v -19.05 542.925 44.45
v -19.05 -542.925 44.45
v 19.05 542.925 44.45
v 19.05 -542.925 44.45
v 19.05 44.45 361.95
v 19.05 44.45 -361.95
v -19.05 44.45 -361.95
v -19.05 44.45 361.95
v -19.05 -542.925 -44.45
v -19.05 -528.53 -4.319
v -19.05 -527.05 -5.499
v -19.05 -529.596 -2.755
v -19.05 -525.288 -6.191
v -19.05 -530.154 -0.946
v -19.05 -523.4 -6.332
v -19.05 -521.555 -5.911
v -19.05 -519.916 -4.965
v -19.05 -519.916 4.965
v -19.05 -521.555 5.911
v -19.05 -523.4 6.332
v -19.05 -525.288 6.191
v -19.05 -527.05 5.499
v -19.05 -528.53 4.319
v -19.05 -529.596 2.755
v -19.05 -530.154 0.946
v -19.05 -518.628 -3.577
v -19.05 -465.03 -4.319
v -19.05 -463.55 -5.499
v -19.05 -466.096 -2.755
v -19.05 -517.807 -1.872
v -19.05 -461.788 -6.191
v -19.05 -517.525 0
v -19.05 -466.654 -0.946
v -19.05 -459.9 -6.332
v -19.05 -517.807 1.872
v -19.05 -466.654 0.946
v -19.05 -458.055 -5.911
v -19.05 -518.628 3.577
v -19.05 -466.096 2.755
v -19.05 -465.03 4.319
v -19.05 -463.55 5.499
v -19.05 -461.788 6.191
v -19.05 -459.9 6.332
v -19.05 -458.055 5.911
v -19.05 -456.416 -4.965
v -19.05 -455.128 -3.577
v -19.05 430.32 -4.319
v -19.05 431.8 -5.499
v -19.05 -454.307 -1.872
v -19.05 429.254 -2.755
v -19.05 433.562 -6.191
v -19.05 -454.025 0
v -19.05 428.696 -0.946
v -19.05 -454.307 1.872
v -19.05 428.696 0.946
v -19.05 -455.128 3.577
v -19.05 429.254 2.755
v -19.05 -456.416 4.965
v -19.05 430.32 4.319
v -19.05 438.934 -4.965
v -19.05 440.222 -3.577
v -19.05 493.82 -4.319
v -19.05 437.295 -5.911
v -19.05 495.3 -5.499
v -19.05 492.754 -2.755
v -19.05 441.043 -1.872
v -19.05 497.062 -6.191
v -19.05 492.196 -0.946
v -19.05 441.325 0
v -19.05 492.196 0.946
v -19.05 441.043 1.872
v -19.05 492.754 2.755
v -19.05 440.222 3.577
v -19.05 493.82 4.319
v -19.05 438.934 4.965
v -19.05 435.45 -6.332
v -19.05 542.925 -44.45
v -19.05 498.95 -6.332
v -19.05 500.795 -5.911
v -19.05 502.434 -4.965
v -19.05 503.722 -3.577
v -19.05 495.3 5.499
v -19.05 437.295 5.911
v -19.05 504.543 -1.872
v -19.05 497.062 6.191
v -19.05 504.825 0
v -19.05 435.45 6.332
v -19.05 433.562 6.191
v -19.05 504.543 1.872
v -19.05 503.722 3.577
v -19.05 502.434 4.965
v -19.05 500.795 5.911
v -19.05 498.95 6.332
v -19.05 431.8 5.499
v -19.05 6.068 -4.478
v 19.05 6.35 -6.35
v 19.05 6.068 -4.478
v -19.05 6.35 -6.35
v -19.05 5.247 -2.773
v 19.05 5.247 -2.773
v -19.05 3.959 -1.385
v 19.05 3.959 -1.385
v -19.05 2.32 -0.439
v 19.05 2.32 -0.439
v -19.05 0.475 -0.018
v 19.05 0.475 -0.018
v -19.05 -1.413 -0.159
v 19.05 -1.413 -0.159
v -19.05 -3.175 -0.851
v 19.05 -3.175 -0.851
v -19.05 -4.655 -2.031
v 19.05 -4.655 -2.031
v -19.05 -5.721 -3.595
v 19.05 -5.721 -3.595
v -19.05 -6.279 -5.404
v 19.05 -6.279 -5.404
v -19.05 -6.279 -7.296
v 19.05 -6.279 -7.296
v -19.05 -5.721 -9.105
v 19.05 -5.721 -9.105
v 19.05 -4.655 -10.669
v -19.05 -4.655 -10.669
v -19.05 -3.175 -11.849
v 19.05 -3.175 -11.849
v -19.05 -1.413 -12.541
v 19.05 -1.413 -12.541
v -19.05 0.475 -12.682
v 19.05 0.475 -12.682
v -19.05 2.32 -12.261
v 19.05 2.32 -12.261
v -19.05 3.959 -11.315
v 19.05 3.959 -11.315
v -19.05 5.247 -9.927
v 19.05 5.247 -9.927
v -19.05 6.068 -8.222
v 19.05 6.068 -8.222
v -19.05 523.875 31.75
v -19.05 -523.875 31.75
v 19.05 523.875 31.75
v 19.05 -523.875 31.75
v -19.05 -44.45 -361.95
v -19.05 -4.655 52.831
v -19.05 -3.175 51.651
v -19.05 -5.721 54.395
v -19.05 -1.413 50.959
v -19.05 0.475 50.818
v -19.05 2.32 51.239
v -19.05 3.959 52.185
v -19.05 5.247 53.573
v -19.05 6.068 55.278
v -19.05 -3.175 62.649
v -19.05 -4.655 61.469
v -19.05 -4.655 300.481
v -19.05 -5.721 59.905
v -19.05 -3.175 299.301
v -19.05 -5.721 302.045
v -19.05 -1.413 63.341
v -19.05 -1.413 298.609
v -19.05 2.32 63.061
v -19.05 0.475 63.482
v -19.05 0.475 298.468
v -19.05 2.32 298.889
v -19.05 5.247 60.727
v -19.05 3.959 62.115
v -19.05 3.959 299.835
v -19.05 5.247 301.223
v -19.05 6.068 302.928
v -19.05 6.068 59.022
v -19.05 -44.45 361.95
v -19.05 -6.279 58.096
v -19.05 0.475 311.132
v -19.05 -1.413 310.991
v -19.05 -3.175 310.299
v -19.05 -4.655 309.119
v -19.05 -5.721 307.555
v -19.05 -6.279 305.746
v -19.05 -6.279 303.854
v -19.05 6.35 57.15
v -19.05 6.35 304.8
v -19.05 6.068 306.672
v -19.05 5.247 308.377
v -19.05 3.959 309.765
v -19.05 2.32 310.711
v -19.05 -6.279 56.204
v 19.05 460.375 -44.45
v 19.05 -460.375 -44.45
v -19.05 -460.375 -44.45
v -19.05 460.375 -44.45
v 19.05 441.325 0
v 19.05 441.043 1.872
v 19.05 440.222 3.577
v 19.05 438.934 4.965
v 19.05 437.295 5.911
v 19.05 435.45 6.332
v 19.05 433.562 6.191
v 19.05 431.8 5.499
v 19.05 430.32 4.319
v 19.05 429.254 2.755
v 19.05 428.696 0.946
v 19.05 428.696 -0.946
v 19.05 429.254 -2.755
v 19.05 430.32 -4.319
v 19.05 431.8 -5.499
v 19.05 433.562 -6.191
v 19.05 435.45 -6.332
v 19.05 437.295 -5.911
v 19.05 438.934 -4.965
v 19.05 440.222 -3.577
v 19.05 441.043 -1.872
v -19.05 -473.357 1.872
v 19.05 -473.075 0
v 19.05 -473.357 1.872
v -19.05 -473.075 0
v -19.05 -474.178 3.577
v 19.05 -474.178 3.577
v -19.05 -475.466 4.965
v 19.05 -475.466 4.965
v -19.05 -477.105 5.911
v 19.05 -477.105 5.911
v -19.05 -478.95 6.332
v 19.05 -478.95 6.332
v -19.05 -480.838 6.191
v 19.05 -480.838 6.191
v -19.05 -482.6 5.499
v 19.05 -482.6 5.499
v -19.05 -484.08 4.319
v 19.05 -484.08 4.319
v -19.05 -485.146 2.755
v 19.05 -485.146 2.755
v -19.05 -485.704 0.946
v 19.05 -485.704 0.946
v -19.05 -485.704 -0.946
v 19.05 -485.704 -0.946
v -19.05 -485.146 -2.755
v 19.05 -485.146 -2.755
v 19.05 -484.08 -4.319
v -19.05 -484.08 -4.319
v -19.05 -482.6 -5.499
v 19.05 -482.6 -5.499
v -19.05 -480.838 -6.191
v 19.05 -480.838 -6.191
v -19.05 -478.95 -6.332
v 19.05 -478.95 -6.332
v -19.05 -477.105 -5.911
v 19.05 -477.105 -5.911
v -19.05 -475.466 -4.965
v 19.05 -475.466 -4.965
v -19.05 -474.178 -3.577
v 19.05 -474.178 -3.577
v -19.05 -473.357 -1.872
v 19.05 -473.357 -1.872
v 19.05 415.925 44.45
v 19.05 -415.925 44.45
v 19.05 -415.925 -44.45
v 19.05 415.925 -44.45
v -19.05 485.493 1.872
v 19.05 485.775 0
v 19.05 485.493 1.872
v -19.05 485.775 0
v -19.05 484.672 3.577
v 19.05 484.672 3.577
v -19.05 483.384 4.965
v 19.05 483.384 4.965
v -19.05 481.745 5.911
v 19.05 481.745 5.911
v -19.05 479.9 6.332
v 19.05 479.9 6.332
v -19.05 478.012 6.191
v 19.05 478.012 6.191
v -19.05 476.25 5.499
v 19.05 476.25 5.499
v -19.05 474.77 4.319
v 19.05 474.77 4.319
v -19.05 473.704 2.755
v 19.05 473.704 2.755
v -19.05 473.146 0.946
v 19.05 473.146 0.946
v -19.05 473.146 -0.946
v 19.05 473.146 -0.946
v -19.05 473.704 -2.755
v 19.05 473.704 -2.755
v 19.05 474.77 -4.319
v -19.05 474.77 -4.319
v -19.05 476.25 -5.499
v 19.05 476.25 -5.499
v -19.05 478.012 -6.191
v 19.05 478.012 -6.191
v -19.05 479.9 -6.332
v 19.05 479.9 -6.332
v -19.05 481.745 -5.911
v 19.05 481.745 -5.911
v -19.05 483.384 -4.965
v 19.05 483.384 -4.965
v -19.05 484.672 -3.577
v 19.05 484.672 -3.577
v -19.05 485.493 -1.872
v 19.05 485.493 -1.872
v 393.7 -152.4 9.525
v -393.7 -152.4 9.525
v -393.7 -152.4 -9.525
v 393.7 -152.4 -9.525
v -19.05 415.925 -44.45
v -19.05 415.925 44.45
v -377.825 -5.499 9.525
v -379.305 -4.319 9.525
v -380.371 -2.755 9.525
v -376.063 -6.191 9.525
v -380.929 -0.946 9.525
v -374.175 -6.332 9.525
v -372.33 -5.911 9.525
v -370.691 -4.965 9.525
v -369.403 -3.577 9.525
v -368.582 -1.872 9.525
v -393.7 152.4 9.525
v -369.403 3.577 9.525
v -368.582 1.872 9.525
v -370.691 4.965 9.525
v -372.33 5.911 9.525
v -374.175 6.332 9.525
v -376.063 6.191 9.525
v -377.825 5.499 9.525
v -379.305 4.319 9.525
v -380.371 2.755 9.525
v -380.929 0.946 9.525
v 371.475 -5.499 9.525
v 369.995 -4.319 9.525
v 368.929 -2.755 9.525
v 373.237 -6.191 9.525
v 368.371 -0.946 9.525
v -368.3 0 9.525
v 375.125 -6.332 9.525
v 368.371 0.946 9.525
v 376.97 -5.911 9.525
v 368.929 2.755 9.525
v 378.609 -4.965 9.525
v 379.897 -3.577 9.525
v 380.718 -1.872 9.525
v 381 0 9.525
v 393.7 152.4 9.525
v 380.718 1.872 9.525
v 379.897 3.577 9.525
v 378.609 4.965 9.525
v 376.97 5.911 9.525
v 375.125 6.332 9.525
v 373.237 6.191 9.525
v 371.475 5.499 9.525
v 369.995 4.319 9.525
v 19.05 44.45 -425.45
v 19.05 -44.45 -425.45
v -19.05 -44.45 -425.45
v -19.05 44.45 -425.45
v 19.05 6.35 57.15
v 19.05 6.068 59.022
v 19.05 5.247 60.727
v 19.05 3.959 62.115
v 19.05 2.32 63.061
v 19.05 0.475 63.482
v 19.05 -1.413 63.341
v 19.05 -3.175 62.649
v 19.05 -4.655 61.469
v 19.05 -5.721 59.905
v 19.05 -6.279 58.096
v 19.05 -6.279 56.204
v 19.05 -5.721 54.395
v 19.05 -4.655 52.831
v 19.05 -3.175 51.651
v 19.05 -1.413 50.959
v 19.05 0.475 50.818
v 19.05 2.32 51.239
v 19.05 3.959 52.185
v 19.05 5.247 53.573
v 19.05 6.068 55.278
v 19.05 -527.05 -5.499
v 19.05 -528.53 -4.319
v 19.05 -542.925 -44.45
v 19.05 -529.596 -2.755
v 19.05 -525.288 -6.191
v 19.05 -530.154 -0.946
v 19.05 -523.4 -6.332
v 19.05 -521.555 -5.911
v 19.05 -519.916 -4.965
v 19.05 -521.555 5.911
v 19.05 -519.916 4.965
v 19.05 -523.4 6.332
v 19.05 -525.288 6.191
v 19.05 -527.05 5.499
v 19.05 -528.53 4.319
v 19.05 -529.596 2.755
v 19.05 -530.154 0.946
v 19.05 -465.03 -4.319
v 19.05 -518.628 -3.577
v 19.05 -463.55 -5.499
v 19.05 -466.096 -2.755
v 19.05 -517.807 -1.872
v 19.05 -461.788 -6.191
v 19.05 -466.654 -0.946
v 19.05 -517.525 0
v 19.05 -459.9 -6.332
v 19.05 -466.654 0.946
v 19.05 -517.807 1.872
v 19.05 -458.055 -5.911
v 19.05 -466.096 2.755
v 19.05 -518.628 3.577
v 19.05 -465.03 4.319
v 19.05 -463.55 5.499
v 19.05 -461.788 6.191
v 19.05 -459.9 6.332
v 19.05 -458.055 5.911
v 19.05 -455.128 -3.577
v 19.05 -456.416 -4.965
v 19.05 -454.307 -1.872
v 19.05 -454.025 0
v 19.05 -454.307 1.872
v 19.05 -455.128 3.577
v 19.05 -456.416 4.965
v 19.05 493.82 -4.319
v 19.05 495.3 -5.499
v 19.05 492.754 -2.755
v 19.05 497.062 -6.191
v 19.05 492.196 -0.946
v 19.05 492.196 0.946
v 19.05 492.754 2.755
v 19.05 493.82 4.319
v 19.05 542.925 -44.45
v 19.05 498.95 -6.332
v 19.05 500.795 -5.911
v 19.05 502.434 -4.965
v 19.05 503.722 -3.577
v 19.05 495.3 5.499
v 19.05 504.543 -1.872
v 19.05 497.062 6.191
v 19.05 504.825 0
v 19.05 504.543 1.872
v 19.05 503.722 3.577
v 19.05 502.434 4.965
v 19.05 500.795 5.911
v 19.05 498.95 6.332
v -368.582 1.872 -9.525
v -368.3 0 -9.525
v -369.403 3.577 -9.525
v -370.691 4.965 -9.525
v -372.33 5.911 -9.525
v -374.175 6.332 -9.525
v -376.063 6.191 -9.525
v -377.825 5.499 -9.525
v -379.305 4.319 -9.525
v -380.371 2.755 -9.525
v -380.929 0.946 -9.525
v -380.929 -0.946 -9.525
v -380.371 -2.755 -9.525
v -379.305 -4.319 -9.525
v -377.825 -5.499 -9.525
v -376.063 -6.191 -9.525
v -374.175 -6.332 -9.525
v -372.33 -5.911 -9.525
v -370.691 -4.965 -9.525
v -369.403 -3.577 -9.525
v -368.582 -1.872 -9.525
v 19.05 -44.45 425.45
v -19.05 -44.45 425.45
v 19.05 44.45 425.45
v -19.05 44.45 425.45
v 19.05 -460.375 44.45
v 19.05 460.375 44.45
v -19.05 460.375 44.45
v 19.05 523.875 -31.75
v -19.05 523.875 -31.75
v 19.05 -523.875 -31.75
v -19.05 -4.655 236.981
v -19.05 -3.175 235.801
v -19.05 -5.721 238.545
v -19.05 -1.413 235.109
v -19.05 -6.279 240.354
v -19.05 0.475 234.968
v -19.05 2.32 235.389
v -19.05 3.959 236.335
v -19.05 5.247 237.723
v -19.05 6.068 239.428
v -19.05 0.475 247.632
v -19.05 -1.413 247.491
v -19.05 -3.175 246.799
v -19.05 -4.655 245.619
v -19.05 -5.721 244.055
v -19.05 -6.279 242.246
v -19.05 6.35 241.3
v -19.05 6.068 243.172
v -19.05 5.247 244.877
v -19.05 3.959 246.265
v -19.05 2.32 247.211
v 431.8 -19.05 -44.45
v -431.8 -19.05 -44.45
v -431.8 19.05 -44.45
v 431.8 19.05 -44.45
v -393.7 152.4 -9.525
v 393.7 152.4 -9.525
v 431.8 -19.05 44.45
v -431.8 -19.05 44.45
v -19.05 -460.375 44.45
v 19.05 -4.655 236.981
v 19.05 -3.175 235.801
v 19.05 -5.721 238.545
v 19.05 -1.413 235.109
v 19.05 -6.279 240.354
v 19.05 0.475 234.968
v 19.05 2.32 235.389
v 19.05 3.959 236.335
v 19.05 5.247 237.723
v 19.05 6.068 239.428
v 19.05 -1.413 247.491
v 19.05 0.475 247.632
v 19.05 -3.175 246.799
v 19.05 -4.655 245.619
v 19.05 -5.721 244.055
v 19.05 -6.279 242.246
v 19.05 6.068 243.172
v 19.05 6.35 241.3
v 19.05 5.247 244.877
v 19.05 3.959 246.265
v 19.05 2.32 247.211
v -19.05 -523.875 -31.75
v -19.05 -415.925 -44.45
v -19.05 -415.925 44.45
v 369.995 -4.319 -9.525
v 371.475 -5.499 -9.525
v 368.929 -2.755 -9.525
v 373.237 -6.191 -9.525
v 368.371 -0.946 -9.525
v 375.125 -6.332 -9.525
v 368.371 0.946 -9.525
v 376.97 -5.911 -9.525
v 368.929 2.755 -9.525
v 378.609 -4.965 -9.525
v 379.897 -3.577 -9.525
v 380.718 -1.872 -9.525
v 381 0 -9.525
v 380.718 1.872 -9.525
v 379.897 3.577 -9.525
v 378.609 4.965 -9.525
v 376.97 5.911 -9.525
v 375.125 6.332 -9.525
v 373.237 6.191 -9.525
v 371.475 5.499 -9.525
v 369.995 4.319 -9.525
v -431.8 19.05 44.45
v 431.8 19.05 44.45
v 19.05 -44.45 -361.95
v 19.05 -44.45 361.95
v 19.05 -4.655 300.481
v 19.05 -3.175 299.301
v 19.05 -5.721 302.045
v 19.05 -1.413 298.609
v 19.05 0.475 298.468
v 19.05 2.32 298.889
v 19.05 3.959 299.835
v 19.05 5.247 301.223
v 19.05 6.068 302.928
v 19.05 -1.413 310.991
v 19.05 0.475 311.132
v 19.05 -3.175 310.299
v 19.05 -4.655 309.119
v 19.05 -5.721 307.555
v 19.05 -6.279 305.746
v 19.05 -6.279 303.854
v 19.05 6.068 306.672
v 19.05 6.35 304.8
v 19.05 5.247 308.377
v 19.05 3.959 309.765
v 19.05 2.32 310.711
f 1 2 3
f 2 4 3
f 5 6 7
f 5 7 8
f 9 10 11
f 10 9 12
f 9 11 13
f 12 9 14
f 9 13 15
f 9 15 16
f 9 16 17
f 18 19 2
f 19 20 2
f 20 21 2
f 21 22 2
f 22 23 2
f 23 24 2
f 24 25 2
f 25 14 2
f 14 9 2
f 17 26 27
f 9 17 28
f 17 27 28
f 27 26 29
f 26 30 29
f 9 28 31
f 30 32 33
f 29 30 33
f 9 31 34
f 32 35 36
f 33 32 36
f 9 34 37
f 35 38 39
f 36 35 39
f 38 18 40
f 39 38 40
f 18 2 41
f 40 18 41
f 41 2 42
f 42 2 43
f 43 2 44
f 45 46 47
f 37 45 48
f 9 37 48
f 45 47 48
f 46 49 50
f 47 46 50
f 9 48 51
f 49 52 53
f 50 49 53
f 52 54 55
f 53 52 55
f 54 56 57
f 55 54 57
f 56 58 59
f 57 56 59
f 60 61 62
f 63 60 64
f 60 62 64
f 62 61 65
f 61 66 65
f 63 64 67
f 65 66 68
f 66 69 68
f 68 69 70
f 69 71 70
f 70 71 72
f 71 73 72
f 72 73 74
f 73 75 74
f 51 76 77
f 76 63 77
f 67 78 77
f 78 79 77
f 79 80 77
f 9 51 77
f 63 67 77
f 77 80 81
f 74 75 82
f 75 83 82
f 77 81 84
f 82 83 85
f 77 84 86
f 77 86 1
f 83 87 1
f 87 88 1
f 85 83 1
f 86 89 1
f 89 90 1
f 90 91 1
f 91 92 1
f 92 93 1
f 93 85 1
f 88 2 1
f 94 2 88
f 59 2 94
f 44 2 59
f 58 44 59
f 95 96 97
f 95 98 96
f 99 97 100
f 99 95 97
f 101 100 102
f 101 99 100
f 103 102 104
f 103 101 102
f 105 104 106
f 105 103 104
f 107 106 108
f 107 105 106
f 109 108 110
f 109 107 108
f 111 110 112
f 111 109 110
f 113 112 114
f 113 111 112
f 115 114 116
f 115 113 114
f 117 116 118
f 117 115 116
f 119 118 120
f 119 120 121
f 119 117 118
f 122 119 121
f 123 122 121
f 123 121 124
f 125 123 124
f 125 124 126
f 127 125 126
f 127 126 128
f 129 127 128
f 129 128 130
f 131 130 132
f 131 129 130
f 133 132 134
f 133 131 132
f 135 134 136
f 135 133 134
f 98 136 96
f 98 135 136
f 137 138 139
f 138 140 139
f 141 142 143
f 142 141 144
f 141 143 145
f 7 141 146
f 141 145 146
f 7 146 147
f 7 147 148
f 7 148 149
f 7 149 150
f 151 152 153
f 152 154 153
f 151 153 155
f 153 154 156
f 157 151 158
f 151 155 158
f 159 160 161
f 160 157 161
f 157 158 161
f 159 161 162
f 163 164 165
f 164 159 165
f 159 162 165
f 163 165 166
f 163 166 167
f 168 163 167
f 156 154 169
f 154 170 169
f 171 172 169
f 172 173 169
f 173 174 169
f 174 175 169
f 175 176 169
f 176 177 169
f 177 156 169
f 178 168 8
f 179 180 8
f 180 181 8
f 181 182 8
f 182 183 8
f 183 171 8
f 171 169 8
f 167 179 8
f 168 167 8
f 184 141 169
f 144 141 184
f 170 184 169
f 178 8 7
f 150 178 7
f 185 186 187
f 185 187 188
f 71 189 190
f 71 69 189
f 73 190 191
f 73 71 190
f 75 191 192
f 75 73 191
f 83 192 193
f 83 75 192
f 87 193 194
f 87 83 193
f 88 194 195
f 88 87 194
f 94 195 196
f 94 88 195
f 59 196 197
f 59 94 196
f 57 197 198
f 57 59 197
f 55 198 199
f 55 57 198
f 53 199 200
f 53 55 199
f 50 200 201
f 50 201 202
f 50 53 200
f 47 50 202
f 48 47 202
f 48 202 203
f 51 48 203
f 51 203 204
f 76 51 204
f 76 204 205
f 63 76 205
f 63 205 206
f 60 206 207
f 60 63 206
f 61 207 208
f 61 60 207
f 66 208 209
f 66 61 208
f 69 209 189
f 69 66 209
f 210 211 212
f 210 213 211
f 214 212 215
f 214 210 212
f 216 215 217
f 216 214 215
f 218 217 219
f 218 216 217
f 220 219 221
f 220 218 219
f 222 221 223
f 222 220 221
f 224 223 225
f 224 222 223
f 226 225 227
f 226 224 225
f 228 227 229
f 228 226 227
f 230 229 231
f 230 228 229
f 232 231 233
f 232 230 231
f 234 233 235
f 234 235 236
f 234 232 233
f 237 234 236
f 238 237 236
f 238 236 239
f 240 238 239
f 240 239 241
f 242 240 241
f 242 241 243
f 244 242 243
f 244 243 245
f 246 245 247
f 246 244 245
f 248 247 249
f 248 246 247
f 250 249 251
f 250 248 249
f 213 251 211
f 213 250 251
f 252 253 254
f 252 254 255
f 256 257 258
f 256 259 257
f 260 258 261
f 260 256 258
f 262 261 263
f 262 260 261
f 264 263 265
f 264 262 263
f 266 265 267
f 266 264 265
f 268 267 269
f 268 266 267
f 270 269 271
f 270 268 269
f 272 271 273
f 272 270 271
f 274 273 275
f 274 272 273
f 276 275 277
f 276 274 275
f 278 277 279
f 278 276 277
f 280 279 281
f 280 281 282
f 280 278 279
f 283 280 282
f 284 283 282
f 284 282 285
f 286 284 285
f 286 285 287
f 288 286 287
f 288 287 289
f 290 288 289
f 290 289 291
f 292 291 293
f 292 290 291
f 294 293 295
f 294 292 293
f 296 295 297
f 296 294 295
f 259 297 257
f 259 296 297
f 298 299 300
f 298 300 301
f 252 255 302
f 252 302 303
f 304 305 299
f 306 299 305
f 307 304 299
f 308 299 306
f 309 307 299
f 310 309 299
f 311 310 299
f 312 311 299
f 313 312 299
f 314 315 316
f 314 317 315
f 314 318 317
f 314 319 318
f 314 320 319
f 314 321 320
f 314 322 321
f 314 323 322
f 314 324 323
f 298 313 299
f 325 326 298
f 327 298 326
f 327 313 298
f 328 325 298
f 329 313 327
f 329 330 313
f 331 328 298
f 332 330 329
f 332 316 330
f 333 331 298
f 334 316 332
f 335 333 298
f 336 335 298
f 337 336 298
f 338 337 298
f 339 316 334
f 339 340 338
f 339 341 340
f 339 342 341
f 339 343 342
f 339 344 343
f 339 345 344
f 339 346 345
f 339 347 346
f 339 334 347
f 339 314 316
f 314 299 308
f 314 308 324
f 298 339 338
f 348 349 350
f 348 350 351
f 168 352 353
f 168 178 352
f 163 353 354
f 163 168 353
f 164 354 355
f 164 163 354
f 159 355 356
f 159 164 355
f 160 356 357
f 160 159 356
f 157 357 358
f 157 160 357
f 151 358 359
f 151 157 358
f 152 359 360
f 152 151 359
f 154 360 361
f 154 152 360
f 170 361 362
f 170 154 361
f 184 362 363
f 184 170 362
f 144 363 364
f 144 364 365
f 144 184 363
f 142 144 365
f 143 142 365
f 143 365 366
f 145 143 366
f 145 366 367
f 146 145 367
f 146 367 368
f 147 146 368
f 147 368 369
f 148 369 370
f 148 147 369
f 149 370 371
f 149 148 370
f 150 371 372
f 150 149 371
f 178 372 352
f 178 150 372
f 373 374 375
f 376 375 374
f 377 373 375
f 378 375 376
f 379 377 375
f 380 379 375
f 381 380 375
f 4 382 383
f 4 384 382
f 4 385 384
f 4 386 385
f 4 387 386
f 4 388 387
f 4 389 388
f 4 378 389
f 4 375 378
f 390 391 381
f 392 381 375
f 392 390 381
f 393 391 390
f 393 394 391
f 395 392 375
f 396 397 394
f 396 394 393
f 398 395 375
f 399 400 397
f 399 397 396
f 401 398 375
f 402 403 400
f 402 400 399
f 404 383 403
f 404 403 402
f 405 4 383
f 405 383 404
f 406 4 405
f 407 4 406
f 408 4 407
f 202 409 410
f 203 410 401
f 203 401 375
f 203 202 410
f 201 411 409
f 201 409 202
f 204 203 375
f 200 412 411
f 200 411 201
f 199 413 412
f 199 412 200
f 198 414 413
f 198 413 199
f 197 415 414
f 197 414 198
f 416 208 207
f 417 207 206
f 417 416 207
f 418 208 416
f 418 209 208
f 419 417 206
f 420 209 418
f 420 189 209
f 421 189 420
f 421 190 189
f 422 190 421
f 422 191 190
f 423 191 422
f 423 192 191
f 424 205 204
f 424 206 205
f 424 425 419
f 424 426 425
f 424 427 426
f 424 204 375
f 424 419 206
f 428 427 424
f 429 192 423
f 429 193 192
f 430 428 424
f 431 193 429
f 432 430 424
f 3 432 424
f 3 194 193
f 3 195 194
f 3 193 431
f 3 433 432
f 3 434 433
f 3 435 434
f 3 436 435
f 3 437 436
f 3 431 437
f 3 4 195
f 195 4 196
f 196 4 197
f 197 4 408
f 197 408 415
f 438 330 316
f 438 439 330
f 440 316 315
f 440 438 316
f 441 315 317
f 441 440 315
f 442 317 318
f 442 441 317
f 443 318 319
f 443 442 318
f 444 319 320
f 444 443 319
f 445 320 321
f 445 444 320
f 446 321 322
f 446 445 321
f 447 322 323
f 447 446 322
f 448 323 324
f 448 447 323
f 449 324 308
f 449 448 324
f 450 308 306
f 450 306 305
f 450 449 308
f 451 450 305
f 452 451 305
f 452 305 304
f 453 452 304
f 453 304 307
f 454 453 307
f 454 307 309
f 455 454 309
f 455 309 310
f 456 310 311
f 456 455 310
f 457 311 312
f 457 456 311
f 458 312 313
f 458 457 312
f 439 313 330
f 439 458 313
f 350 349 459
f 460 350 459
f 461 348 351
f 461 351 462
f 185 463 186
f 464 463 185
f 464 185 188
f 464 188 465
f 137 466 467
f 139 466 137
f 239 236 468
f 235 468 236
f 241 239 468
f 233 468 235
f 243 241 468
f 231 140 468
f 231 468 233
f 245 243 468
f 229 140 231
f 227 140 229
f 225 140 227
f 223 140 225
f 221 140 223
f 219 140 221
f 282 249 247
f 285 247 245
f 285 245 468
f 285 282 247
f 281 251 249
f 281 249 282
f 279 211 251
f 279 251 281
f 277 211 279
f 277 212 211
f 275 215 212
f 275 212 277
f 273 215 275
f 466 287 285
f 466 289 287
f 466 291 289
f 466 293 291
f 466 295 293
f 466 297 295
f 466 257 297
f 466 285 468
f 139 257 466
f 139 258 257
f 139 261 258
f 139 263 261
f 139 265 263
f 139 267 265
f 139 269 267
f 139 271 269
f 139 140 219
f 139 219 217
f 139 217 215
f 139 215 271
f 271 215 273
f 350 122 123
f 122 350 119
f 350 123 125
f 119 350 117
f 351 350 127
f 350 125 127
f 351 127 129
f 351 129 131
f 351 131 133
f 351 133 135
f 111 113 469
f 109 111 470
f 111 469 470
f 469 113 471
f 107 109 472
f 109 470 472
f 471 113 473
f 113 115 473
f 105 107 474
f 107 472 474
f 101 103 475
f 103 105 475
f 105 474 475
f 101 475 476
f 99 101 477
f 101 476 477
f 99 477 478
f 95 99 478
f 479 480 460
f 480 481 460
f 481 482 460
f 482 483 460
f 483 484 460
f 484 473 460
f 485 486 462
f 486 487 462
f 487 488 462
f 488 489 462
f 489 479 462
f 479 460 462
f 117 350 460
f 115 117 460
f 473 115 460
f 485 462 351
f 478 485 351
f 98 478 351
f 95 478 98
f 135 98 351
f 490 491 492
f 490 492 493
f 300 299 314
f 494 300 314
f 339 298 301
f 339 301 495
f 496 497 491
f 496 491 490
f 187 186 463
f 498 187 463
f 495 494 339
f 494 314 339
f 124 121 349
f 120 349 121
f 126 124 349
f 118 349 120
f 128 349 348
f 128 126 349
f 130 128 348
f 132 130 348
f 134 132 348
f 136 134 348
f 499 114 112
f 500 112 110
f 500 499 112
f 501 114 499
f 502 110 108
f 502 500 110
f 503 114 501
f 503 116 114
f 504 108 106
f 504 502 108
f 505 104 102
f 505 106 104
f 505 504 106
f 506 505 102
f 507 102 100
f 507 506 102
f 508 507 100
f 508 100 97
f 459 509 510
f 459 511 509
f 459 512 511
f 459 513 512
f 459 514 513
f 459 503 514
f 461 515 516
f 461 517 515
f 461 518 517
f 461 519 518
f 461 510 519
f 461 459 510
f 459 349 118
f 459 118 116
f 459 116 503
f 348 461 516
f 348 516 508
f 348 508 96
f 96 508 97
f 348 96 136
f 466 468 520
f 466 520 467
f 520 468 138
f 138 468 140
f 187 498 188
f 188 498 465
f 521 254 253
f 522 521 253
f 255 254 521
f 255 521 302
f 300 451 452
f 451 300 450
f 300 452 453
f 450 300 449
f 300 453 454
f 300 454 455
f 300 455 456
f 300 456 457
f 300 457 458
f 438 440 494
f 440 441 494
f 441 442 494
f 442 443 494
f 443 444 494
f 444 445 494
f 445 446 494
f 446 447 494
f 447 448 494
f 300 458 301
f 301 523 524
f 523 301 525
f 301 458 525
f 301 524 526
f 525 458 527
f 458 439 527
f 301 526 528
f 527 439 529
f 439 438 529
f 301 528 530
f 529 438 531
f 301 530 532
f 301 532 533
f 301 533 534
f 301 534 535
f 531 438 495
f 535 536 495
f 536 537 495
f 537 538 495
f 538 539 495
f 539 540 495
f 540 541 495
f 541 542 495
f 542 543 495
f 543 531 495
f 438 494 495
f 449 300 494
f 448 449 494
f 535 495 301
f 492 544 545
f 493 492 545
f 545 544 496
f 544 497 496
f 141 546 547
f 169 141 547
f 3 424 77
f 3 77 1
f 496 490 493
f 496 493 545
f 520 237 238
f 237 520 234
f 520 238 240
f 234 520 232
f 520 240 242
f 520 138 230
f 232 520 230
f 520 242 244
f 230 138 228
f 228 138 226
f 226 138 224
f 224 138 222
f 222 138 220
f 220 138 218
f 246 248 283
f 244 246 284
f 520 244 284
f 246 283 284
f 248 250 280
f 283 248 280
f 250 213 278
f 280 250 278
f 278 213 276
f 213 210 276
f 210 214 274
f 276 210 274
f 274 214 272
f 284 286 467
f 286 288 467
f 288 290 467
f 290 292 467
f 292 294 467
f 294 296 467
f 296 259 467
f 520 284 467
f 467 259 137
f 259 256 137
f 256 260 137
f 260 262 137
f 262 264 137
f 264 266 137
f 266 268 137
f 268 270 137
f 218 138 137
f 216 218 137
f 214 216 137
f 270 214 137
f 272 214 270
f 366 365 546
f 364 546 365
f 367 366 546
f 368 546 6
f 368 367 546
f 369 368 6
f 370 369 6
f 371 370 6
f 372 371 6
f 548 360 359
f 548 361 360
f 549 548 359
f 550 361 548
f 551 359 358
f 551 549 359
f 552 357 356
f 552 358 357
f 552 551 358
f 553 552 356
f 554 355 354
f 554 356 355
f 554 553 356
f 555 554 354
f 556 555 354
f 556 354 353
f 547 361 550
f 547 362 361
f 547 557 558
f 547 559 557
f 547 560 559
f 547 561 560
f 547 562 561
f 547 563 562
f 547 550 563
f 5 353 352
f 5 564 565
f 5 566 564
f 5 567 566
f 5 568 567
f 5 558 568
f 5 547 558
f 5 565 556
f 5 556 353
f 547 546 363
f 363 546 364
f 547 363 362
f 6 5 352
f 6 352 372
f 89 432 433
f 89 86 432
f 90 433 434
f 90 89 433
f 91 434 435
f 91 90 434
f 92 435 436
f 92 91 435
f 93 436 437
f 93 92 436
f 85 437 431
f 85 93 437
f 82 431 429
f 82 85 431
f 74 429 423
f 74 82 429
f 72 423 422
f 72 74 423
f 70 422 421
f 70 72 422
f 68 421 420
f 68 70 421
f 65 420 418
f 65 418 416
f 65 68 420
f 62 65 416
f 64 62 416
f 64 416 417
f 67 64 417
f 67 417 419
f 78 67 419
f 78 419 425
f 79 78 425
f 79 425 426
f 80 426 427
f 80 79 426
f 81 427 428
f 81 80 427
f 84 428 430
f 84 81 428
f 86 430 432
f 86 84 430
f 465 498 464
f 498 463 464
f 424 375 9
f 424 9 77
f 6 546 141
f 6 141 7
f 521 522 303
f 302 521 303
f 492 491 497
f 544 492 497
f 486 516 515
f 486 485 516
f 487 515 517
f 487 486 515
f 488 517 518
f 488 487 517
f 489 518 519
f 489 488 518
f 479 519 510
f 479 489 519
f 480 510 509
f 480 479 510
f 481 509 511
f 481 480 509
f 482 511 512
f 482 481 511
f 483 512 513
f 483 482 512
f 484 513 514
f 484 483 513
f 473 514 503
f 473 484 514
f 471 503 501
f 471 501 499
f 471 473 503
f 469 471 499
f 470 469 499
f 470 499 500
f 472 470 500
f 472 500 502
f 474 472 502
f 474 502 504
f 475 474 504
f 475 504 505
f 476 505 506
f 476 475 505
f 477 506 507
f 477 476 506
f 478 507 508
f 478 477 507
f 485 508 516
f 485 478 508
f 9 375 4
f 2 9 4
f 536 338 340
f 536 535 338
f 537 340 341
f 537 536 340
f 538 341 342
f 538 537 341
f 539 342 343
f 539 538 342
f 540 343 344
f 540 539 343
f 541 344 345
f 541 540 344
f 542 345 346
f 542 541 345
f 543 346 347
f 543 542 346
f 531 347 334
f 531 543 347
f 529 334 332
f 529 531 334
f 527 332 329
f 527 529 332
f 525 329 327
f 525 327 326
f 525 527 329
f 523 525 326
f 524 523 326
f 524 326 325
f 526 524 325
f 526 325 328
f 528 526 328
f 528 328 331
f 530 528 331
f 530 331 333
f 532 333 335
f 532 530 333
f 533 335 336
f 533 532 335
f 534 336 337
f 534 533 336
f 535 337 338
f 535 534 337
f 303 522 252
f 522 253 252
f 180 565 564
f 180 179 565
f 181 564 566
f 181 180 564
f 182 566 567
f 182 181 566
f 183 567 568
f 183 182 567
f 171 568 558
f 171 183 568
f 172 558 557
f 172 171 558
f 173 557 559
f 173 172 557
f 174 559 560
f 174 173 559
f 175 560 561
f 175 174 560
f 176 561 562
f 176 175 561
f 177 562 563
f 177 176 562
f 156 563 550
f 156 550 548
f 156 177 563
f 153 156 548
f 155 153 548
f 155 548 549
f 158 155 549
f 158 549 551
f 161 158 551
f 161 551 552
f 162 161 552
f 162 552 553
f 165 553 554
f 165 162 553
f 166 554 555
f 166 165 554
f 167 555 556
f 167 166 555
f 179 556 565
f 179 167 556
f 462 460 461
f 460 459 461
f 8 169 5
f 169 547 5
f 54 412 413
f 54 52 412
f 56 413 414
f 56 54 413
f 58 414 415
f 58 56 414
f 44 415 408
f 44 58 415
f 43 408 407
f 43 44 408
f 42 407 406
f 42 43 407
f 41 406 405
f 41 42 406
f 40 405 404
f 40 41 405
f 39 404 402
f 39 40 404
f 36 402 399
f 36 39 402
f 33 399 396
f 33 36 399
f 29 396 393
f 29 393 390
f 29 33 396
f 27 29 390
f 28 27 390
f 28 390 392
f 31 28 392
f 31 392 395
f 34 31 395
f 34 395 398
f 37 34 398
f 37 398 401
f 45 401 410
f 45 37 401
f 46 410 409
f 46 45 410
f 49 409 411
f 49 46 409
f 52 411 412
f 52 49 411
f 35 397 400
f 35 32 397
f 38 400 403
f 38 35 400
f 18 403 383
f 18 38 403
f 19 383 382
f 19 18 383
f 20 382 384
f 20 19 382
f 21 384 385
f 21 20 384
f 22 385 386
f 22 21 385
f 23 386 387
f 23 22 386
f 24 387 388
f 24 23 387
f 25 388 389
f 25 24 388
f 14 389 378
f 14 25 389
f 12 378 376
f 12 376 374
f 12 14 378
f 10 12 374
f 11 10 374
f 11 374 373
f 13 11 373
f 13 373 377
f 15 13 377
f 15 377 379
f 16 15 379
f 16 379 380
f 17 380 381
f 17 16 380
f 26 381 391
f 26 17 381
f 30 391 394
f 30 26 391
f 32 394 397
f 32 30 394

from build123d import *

# Parameters (mm, degrees)
F0_W      = 863.6
F0_H      = 88.9
F1_DEPTH  = 19.05
F2_W      = 1085.85
F2_H      = 88.9
F2_R      = 6.35
F3_DEPTH  = 19.05
F4_W      = 88.9
F4_H      = 723.9
F4_R      = 6.35
F5_DEPTH  = 19.05
F6_W      = 88.9
F6_H      = 850.9
F6_R      = 6.35
F7_DEPTH  = 19.05
F8_W      = 787.4
F8_H      = 304.8
F8_R      = 6.35
F9_DEPTH  = 9.525
F10_W     = 1047.75
F10_H     = 63.5
F10_R     = 6.35
F11_DEPTH = 19.05
F12_W     = 920.75
F12_H     = 88.9
F13_DEPTH = 19.05
F14_W     = 831.85
F14_H     = 88.9
F15_DEPTH = 19.05


with BuildPart() as f1:
    # F0 (on Front) → F1 (new body, symmetric)
    with BuildSketch(Plane.XZ):
        Rectangle(F0_W, F0_H)
    extrude(amount=F1_DEPTH, both=True)


with BuildPart() as f3:
    # F2 (on Right) → F3 (new body, symmetric)
    with BuildSketch(Plane.YZ):
        Rectangle(F2_W, F2_H)
        with Locations((-523.875, 0)):
            Circle(F2_R, mode=Mode.SUBTRACT)
        with Locations((-460.375, 0)):
            Circle(F2_R, mode=Mode.SUBTRACT)
        with Locations((434.975, 0)):
            Circle(F2_R, mode=Mode.SUBTRACT)
        with Locations((498.475, 0)):
            Circle(F2_R, mode=Mode.SUBTRACT)
    extrude(amount=F3_DEPTH, both=True)


with BuildPart() as f5:
    # F4 (on Right) → F5 (new body, symmetric)
    with BuildSketch(Plane.YZ):
        Rectangle(F4_W, F4_H)
        with Locations((0, 57.15)):
            Circle(F4_R, mode=Mode.SUBTRACT)
        with Locations((0, 304.8)):
            Circle(F4_R, mode=Mode.SUBTRACT)
    extrude(amount=F5_DEPTH, both=True)


with BuildPart() as f7:
    # F6 (on Right) → F7 (new body, symmetric)
    with BuildSketch(Plane.YZ):
        Rectangle(F6_W, F6_H)
        with Locations((0, -6.35)):
            Circle(F6_R, mode=Mode.SUBTRACT)
        with Locations((0, 241.3)):
            Circle(F6_R, mode=Mode.SUBTRACT)
    extrude(amount=F7_DEPTH, both=True)


with BuildPart() as f9:
    # F8 (on Top) → F9 (new body, symmetric)
    with BuildSketch(Plane.XY):
        Rectangle(F8_W, F8_H)
        with Locations((-374.65, 0)):
            Circle(F8_R, mode=Mode.SUBTRACT)
        with Locations((374.65, 0)):
            Circle(F8_R, mode=Mode.SUBTRACT)
    extrude(amount=F9_DEPTH, both=True)


with BuildPart() as f11:
    # F10 (on Right) → F11 (new body, symmetric)
    with BuildSketch(Plane.YZ):
        Rectangle(F10_W, F10_H)
        with Locations((-479.425, 0)):
            Circle(F10_R, mode=Mode.SUBTRACT)
        with Locations((479.425, 0)):
            Circle(F10_R, mode=Mode.SUBTRACT)
    extrude(amount=F11_DEPTH, both=True)


with BuildPart() as f13:
    # F12 (on Right) → F13 (new body, symmetric)
    with BuildSketch(Plane.YZ):
        Rectangle(F12_W, F12_H)
    extrude(amount=F13_DEPTH, both=True)


with BuildPart() as f15:
    # F14 (on Right) → F15 (new body, symmetric)
    with BuildSketch(Plane.YZ):
        Rectangle(F14_W, F14_H)
    extrude(amount=F15_DEPTH, both=True)


solid = Compound([f1.part, f3.part, f5.part, f7.part, f9.part, f11.part, f13.part, f15.part])
